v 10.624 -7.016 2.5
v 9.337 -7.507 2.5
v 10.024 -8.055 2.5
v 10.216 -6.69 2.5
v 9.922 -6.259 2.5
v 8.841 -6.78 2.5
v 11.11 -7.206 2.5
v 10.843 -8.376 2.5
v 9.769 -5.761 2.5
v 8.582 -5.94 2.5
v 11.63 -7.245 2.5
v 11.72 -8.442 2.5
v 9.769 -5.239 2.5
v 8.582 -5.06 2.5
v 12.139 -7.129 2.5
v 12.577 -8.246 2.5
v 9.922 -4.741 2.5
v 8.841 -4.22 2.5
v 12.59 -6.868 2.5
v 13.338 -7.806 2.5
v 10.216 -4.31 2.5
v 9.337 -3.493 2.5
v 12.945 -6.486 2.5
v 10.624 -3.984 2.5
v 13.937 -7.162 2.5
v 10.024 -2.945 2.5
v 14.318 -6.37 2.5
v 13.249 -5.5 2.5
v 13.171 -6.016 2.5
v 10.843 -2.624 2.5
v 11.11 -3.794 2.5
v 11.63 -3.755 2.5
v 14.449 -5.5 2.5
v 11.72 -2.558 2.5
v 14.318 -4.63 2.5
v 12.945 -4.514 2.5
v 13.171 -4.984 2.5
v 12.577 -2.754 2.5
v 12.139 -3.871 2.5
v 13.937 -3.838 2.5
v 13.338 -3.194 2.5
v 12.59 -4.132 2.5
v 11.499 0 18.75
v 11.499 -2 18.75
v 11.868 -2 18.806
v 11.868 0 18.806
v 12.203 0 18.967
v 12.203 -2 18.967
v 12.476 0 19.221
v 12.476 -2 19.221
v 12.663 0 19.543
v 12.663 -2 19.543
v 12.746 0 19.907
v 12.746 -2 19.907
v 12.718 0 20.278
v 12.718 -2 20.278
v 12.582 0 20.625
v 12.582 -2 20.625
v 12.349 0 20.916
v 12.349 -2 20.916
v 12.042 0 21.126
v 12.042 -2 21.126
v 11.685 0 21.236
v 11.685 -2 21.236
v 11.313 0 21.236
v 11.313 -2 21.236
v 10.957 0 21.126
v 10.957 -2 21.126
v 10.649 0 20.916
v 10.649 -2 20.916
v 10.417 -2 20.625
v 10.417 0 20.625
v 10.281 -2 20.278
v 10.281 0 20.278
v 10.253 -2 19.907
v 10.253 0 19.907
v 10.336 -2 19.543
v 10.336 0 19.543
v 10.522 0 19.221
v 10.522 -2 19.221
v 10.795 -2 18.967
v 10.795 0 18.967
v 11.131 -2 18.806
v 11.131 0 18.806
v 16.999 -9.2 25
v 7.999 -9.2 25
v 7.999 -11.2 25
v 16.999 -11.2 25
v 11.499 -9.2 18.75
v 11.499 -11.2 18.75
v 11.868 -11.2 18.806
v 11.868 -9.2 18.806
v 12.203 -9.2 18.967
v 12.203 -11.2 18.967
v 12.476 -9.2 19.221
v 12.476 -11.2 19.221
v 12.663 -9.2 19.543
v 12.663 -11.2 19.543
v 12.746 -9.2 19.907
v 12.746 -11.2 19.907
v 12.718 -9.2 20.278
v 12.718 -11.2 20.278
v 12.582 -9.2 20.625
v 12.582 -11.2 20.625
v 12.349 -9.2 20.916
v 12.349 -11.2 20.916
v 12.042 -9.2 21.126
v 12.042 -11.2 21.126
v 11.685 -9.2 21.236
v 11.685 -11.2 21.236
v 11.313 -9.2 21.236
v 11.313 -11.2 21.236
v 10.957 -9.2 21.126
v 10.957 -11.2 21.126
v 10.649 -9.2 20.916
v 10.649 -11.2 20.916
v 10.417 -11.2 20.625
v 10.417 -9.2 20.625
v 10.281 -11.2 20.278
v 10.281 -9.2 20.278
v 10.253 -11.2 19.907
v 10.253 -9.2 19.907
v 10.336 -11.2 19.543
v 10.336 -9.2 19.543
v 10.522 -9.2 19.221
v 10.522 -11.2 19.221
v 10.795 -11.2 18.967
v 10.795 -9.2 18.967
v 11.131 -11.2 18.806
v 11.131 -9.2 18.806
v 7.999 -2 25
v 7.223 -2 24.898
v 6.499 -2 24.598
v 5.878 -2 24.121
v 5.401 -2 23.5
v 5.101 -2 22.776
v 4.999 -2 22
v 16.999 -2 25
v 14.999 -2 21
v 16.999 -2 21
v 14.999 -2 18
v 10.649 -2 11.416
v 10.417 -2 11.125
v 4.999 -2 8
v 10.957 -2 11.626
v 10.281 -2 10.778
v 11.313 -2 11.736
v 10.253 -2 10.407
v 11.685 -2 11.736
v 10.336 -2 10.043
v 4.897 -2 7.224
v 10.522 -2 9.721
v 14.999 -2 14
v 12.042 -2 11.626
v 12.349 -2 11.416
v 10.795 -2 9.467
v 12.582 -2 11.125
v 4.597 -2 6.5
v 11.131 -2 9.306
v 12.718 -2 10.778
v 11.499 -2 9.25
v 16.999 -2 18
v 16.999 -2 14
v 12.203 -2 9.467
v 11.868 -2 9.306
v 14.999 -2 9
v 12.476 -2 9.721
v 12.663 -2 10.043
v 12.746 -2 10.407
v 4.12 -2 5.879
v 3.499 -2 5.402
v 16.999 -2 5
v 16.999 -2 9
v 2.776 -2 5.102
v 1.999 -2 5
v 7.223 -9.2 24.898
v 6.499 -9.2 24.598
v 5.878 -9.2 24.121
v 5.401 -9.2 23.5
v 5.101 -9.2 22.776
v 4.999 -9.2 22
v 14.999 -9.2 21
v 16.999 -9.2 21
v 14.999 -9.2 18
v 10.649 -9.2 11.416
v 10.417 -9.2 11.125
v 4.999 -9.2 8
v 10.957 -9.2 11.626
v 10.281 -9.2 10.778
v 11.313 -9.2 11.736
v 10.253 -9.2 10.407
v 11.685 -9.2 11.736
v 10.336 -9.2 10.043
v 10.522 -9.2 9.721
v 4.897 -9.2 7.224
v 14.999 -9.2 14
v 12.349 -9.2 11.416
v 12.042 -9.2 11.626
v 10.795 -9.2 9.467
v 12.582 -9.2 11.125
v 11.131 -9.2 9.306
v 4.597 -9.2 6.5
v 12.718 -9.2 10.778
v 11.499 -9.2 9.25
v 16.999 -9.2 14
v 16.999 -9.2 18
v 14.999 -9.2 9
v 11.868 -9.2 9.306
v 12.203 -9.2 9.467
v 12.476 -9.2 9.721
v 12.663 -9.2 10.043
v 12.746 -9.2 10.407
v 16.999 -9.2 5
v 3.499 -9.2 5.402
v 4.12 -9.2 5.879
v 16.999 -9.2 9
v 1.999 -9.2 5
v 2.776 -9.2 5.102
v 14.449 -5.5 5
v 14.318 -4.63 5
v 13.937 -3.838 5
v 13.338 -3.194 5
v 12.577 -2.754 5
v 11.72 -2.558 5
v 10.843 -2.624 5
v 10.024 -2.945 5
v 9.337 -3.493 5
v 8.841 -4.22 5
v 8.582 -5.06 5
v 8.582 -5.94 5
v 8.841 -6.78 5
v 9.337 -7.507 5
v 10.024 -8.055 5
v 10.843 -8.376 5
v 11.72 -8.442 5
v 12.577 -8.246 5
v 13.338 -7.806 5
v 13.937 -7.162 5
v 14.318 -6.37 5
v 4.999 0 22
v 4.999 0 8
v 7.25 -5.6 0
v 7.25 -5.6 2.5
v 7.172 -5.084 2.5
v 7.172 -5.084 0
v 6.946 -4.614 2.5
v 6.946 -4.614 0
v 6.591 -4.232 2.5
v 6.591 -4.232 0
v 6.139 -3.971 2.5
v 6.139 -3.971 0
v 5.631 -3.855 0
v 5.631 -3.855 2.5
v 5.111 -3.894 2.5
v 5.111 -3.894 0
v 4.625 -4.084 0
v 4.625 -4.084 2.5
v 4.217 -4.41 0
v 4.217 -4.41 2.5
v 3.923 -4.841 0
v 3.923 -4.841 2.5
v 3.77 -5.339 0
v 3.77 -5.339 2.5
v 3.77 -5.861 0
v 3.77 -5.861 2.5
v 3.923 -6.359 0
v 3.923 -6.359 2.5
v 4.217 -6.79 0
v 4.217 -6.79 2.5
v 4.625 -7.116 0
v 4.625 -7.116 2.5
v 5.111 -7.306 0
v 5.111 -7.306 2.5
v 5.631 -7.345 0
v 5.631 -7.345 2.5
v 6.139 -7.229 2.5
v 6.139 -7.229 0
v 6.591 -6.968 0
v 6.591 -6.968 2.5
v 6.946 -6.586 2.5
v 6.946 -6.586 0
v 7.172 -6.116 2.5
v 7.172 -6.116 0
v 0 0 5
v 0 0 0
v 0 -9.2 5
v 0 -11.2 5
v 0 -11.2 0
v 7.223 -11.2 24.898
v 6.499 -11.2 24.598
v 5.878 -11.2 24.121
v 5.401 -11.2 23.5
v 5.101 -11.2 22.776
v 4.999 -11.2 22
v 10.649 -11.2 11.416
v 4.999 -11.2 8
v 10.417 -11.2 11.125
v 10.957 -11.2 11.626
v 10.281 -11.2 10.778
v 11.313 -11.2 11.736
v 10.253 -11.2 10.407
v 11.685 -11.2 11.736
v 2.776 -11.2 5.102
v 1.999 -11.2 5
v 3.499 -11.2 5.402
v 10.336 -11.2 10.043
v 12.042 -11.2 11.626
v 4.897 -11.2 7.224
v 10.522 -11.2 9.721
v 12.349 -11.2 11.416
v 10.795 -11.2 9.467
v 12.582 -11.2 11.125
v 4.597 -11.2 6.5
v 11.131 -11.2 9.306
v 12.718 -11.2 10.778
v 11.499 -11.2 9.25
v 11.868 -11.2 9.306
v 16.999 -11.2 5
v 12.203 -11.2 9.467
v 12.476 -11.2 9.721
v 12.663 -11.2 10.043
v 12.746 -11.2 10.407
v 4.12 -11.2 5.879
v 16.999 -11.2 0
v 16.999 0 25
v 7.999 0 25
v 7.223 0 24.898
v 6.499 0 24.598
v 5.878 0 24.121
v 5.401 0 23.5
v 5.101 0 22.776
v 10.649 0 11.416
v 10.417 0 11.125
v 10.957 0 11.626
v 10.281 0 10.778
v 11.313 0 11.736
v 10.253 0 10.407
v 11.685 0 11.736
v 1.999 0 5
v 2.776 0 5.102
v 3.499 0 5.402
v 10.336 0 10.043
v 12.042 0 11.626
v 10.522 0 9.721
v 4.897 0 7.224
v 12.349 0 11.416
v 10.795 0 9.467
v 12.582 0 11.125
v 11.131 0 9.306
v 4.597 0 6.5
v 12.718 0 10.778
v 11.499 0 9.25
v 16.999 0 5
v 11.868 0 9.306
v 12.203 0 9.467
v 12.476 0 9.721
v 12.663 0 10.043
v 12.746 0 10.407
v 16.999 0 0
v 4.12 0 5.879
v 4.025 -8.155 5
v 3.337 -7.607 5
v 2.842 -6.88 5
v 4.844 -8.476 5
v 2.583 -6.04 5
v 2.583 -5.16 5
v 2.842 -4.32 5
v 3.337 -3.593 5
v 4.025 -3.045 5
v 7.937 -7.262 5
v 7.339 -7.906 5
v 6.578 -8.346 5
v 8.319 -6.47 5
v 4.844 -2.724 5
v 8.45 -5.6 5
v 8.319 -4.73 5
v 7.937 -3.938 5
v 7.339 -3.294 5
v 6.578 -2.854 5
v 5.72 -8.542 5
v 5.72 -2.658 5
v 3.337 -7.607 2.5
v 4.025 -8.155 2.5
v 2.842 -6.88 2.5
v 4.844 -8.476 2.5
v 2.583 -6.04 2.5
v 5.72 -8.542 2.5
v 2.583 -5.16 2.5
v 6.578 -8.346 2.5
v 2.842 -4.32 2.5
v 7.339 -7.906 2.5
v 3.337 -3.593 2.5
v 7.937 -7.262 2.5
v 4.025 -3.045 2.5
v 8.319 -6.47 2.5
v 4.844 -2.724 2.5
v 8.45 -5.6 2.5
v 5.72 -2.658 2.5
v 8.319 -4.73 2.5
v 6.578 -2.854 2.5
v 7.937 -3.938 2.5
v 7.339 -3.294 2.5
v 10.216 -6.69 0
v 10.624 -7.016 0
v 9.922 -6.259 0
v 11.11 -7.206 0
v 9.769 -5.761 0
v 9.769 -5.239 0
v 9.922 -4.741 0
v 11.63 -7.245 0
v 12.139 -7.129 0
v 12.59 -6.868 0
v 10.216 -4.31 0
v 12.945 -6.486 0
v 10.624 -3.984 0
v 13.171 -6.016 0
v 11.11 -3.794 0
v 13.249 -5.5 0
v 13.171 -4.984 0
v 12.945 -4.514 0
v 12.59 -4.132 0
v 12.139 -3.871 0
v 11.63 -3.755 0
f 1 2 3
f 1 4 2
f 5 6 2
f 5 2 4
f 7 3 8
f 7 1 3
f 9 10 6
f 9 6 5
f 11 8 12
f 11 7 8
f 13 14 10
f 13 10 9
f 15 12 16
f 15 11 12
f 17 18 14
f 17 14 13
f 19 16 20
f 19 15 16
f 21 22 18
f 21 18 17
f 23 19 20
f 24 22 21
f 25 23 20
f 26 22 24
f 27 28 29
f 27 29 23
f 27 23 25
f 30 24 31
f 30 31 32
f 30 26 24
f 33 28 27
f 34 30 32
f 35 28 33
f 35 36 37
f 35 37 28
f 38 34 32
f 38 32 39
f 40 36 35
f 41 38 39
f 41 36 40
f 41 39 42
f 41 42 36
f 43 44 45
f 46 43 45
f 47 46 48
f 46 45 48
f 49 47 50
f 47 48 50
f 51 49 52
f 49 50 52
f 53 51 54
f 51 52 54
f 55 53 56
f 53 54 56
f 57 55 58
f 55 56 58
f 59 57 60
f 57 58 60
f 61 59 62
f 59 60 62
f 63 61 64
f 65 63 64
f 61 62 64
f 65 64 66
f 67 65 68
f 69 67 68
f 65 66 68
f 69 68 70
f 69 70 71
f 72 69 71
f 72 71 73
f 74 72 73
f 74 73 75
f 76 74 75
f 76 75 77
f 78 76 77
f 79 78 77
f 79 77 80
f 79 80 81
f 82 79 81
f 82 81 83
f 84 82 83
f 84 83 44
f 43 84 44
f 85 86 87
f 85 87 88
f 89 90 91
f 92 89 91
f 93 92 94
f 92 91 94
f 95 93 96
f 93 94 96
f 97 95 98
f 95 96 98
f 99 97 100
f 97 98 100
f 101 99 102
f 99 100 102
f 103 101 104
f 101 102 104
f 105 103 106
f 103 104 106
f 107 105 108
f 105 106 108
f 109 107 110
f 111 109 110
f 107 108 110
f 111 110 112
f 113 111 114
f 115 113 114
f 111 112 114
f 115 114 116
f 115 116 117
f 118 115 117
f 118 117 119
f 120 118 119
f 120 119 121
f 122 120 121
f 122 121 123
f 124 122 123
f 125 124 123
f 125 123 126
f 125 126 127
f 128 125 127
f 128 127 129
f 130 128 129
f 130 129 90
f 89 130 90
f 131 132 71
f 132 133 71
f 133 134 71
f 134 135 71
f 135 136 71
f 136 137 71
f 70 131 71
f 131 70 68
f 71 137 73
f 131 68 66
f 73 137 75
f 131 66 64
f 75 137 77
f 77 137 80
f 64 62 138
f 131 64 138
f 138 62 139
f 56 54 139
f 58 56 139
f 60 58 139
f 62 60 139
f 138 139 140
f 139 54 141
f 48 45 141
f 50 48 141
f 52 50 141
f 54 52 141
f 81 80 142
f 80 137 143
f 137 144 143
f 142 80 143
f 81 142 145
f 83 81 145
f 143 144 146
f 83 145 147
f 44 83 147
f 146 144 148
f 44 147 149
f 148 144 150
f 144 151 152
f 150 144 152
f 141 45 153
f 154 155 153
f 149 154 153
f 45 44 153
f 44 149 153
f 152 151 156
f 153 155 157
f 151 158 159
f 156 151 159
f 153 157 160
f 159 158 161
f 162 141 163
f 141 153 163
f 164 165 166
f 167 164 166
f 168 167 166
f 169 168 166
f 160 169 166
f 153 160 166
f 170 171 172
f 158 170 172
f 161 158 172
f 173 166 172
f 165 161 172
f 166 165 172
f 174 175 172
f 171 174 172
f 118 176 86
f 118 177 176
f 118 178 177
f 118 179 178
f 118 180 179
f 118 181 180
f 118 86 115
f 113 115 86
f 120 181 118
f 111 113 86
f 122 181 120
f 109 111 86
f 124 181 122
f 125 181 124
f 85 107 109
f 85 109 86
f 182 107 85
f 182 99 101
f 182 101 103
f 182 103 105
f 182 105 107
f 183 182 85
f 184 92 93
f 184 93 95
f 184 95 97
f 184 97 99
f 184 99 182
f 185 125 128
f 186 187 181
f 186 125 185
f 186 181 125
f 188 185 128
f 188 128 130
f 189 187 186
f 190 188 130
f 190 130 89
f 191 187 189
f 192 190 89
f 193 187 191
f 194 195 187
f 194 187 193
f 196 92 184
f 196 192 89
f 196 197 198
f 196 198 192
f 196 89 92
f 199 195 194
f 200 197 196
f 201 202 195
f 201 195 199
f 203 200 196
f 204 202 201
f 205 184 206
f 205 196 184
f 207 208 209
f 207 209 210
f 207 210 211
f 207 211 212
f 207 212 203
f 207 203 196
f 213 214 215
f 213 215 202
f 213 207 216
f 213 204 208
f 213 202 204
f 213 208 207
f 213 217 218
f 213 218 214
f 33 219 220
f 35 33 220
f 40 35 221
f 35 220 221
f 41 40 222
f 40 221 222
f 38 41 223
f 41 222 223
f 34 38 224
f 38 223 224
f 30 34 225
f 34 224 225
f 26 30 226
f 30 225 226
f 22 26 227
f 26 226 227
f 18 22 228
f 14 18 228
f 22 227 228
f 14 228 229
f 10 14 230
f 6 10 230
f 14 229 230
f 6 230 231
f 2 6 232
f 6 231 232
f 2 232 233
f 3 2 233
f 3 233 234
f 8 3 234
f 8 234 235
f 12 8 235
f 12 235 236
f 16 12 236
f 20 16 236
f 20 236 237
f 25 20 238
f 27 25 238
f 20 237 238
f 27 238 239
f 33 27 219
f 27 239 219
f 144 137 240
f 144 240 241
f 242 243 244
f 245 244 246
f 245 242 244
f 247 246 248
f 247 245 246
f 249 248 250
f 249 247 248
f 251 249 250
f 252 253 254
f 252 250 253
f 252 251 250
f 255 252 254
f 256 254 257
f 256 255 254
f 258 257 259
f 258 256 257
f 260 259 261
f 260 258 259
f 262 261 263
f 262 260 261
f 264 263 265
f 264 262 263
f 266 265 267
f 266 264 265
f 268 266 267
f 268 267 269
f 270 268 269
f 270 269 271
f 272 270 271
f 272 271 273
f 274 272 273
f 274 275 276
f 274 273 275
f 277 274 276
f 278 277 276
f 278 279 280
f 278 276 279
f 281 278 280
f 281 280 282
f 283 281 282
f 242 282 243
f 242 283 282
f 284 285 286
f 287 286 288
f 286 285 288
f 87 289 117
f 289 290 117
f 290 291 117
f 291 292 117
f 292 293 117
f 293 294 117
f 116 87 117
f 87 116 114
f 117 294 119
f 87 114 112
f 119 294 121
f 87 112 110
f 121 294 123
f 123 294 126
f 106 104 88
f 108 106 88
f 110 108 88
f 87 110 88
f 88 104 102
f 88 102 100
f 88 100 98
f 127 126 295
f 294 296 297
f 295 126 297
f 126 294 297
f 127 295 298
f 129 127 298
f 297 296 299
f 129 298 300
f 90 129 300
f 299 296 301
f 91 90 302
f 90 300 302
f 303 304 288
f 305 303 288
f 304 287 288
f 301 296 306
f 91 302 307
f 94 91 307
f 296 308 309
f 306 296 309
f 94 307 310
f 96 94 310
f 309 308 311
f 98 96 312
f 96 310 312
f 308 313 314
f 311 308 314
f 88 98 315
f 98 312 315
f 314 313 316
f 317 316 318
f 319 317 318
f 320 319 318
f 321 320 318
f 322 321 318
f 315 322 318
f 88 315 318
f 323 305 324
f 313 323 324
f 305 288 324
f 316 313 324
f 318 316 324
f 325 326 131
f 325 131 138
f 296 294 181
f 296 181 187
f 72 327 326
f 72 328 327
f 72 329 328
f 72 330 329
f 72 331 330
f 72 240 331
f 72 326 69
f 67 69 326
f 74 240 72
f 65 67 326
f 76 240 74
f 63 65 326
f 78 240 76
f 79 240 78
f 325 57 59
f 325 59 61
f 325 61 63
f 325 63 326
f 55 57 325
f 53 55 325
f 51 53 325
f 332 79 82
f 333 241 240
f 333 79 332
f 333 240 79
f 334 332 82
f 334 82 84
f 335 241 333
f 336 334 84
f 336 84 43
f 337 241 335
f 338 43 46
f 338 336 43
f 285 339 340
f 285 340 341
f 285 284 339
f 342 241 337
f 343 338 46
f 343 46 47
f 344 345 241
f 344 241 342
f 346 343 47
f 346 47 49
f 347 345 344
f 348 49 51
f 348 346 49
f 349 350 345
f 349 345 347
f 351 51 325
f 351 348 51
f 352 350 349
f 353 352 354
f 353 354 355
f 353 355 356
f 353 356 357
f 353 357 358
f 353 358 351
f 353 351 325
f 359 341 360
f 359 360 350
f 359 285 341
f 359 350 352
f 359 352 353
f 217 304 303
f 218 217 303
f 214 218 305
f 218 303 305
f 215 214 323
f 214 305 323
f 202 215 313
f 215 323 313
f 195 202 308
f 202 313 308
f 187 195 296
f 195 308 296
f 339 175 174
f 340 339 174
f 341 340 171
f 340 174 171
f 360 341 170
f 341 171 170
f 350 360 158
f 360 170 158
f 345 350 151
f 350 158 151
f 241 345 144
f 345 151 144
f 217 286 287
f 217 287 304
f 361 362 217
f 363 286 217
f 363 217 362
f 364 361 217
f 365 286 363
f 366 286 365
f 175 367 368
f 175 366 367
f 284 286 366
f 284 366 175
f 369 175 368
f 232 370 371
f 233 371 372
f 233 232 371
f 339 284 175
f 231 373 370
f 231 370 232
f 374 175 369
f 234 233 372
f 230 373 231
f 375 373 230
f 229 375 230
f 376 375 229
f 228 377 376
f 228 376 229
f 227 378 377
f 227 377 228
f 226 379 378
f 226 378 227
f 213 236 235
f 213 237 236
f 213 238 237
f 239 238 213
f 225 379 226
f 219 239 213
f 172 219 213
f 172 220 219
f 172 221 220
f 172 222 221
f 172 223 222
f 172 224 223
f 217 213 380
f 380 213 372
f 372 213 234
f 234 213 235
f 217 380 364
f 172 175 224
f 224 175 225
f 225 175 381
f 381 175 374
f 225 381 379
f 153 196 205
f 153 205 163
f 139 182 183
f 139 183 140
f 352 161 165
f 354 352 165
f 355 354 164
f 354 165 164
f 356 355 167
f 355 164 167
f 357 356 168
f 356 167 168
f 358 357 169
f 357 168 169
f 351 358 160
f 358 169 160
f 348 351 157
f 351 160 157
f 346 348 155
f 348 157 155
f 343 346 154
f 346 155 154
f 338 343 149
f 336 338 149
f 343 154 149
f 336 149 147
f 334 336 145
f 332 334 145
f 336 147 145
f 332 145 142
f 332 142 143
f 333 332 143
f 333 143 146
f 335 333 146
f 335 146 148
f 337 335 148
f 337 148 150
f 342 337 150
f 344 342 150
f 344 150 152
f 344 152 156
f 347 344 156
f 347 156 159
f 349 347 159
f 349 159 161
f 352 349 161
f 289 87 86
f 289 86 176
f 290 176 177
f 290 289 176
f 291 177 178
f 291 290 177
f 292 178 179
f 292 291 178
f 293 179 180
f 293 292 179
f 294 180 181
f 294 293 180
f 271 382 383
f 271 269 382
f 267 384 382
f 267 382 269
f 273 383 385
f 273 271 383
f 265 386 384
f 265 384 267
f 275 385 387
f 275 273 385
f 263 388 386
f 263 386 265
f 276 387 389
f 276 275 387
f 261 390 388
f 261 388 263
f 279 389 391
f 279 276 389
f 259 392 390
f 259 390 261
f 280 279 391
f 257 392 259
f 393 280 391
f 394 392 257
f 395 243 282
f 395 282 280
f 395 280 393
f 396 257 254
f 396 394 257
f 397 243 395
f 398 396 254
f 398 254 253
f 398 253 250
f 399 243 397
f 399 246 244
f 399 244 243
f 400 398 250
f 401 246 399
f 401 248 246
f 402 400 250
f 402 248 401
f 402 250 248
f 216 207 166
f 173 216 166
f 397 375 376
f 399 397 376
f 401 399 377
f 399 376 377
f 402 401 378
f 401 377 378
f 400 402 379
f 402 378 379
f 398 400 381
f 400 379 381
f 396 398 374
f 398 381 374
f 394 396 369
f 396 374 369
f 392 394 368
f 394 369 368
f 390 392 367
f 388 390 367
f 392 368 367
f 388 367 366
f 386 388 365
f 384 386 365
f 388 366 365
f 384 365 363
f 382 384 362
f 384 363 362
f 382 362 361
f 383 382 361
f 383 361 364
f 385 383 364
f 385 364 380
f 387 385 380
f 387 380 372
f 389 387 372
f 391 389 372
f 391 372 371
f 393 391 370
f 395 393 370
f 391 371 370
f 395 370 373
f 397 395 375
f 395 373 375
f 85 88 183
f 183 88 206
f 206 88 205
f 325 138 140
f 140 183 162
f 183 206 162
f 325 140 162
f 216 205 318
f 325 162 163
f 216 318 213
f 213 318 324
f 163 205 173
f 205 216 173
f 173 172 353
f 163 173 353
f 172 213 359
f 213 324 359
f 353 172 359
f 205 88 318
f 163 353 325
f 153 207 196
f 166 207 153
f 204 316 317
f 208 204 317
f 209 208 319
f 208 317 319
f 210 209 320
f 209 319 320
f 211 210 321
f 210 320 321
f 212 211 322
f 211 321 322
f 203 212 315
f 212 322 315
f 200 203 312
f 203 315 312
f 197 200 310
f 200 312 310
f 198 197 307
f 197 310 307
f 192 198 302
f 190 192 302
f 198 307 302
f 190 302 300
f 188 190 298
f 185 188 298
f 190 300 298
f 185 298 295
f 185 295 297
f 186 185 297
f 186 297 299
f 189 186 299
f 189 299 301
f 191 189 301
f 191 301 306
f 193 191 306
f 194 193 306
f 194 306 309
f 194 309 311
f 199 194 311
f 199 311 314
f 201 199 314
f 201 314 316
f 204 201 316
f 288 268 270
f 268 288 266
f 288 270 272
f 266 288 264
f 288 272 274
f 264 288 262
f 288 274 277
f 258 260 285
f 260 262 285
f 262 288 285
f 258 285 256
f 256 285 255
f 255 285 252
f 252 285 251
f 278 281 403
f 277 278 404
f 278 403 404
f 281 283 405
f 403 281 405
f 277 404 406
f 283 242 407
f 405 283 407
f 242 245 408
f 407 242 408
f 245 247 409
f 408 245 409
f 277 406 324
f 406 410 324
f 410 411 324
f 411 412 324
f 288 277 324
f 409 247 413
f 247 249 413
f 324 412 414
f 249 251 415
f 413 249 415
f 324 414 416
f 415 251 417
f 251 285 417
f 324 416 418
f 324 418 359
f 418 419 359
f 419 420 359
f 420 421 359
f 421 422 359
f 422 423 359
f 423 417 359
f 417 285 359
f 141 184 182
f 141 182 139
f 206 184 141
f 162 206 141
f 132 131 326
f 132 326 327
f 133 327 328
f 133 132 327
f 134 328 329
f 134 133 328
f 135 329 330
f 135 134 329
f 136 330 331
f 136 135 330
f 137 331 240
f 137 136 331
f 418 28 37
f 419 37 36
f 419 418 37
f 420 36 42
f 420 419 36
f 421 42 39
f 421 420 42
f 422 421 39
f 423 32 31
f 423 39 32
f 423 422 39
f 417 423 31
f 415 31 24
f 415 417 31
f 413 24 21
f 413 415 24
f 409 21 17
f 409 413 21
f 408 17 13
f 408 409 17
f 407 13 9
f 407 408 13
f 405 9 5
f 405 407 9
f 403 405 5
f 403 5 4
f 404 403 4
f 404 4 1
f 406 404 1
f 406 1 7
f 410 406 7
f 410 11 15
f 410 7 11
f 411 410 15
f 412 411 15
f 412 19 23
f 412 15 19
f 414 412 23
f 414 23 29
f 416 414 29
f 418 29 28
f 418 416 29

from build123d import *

# Parameters (mm, degrees)
ESQUISSE1_W             = 16.999166609
ESQUISSE1_H             = 11.2
ESQUISSE1_R             = 1.75
BOSS_EXTRU_1_DEPTH      = 5
ESQUISSE2_W             = 2
ESQUISSE2_H             = 7.2
BOSS_EXTRU_2_DEPTH      = 20
ESQUISSE3_W             = 4
ESQUISSE3_H             = 7.2
ENL_V_MAT_EXTRU_1_DEPTH = 20
ESQUISSE4_R             = 1.25
ESQUISSE4_W             = 4.999166609
ESQUISSE4_H             = 20
ENL_V_MAT_EXTRU_2_DEPTH = 20
ESQUISSE5_R             = 2.95
ENL_V_MAT_EXTRU_3_DEPTH = 2.5
CONG_1_START            = -11.2
CONG_1_DEPTH            = 12.2
CONG_1_2_DEPTH          = 2
CONG_1_START_2          = -2
CONG_1_3_DEPTH          = 2


with BuildPart() as part:
    # Esquisse1 → Boss.-Extru.1 (new body)
    with BuildSketch(Plane.XY):
        with Locations((8.499583304, -5.6)):
            Rectangle(ESQUISSE1_W, ESQUISSE1_H)
        with Locations((5.5, -5.6)):
            Circle(ESQUISSE1_R, mode=Mode.SUBTRACT)
        with Locations((11.499166609, -5.5)):
            Circle(ESQUISSE1_R, mode=Mode.SUBTRACT)
    extrude(amount=BOSS_EXTRU_1_DEPTH)

    # Esquisse2 → Boss.-Extru.2 (add)
    with BuildSketch(Plane.XY.offset(5)):
        Polygon((14.999166609, -9.2), (0, -9.2), (0, -11.2), (16.999166609, -11.2), (16.999166609, -9.2), align=None)
        with Locations((15.999166609, -5.6)):
            Rectangle(ESQUISSE2_W, ESQUISSE2_H)
        Polygon((16.999166609, 0), (0, 0), (0, -2), (14.999166609, -2), (16.999166609, -2), align=None)
    extrude(amount=BOSS_EXTRU_2_DEPTH)

    # Esquisse3 → Enlèv. mat.-Extru.1 (cut)
    with BuildSketch(Plane.ZY.offset(-14.999166609)):
        with Locations((7, -5.6)):
            Rectangle(ESQUISSE3_W, ESQUISSE3_H)
        with Locations((23, -5.6)):
            Rectangle(ESQUISSE3_W, ESQUISSE3_H)
        with Locations((16, -5.6)):
            Rectangle(ESQUISSE3_W, ESQUISSE3_H)
    extrude(amount=-ENL_V_MAT_EXTRU_1_DEPTH, mode=Mode.SUBTRACT)

    # Esquisse4 → Enlèv. mat.-Extru.2 (cut)
    with BuildSketch(Plane(origin=(0, -11.2, 0), x_dir=(-1, 0, 0), z_dir=(0, -1, 0))):
        with Locations(Location((-11.499166609, -20, 0), (0, 0, 90))):
            Circle(ESQUISSE4_R)
        with Locations(Location((-11.499166609, -10.5, 0), (0, 0, 90))):
            Circle(ESQUISSE4_R)
        with Locations((-2.499583305, -15)):
            Rectangle(ESQUISSE4_W, ESQUISSE4_H)
    extrude(amount=-ENL_V_MAT_EXTRU_2_DEPTH, mode=Mode.SUBTRACT)

    # Esquisse5 → Enlèv. mat.-Extru.3 (cut)
    with BuildSketch(Plane.XY.offset(5)):
        with Locations((5.5, -5.6)):
            Circle(ESQUISSE5_R)
        with Locations((11.499166609, -5.5)):
            Circle(ESQUISSE5_R)
    extrude(amount=-ENL_V_MAT_EXTRU_3_DEPTH, mode=Mode.SUBTRACT)

    # Congé1: read off the stored shape, not the designer's step
    # Congé1 outline → Congé1 (cut)
    with BuildSketch(Plane(origin=(0, 0, 0), x_dir=(1, 0, 0), z_dir=(0, 1, 0)).offset(CONG_1_START)):
        with BuildLine():
            ThreePointArc((7.999166609, -25), (5.877846265, -24.121320344), (4.999166609, -22))
            Line((4.999166609, -22), (4.999166609, -25))
            Line((4.999166609, -25), (7.999166609, -25))
        make_face()
    extrude(amount=CONG_1_DEPTH, mode=Mode.SUBTRACT)

    # Cong_1 2 outline → Cong_1 2 (add)
    with BuildSketch(Plane(origin=(0, 0, 0), x_dir=(1, 0, 0), z_dir=(0, 1, 0)).offset(CONG_1_START)):
        with BuildLine():
            ThreePointArc((1.999166609, -5), (4.120486952, -5.878679656), (4.999166609, -8))
            Line((4.999166609, -8), (4.999166609, -5))
            Line((4.999166609, -5), (1.999166609, -5))
        make_face()
    extrude(amount=CONG_1_2_DEPTH)

    # Cong_1 3 outline → Cong_1 3 (add)
    with BuildSketch(Plane(origin=(0, 0, 0), x_dir=(1, 0, 0), z_dir=(0, 1, 0)).offset(CONG_1_START_2)):
        with BuildLine():
            ThreePointArc((1.999166609, -5), (4.120486952, -5.878679656), (4.999166609, -8))
            Line((4.999166609, -8), (4.999166609, -5))
            Line((4.999166609, -5), (1.999166609, -5))
        make_face()
    extrude(amount=CONG_1_3_DEPTH)


solid = part.part
